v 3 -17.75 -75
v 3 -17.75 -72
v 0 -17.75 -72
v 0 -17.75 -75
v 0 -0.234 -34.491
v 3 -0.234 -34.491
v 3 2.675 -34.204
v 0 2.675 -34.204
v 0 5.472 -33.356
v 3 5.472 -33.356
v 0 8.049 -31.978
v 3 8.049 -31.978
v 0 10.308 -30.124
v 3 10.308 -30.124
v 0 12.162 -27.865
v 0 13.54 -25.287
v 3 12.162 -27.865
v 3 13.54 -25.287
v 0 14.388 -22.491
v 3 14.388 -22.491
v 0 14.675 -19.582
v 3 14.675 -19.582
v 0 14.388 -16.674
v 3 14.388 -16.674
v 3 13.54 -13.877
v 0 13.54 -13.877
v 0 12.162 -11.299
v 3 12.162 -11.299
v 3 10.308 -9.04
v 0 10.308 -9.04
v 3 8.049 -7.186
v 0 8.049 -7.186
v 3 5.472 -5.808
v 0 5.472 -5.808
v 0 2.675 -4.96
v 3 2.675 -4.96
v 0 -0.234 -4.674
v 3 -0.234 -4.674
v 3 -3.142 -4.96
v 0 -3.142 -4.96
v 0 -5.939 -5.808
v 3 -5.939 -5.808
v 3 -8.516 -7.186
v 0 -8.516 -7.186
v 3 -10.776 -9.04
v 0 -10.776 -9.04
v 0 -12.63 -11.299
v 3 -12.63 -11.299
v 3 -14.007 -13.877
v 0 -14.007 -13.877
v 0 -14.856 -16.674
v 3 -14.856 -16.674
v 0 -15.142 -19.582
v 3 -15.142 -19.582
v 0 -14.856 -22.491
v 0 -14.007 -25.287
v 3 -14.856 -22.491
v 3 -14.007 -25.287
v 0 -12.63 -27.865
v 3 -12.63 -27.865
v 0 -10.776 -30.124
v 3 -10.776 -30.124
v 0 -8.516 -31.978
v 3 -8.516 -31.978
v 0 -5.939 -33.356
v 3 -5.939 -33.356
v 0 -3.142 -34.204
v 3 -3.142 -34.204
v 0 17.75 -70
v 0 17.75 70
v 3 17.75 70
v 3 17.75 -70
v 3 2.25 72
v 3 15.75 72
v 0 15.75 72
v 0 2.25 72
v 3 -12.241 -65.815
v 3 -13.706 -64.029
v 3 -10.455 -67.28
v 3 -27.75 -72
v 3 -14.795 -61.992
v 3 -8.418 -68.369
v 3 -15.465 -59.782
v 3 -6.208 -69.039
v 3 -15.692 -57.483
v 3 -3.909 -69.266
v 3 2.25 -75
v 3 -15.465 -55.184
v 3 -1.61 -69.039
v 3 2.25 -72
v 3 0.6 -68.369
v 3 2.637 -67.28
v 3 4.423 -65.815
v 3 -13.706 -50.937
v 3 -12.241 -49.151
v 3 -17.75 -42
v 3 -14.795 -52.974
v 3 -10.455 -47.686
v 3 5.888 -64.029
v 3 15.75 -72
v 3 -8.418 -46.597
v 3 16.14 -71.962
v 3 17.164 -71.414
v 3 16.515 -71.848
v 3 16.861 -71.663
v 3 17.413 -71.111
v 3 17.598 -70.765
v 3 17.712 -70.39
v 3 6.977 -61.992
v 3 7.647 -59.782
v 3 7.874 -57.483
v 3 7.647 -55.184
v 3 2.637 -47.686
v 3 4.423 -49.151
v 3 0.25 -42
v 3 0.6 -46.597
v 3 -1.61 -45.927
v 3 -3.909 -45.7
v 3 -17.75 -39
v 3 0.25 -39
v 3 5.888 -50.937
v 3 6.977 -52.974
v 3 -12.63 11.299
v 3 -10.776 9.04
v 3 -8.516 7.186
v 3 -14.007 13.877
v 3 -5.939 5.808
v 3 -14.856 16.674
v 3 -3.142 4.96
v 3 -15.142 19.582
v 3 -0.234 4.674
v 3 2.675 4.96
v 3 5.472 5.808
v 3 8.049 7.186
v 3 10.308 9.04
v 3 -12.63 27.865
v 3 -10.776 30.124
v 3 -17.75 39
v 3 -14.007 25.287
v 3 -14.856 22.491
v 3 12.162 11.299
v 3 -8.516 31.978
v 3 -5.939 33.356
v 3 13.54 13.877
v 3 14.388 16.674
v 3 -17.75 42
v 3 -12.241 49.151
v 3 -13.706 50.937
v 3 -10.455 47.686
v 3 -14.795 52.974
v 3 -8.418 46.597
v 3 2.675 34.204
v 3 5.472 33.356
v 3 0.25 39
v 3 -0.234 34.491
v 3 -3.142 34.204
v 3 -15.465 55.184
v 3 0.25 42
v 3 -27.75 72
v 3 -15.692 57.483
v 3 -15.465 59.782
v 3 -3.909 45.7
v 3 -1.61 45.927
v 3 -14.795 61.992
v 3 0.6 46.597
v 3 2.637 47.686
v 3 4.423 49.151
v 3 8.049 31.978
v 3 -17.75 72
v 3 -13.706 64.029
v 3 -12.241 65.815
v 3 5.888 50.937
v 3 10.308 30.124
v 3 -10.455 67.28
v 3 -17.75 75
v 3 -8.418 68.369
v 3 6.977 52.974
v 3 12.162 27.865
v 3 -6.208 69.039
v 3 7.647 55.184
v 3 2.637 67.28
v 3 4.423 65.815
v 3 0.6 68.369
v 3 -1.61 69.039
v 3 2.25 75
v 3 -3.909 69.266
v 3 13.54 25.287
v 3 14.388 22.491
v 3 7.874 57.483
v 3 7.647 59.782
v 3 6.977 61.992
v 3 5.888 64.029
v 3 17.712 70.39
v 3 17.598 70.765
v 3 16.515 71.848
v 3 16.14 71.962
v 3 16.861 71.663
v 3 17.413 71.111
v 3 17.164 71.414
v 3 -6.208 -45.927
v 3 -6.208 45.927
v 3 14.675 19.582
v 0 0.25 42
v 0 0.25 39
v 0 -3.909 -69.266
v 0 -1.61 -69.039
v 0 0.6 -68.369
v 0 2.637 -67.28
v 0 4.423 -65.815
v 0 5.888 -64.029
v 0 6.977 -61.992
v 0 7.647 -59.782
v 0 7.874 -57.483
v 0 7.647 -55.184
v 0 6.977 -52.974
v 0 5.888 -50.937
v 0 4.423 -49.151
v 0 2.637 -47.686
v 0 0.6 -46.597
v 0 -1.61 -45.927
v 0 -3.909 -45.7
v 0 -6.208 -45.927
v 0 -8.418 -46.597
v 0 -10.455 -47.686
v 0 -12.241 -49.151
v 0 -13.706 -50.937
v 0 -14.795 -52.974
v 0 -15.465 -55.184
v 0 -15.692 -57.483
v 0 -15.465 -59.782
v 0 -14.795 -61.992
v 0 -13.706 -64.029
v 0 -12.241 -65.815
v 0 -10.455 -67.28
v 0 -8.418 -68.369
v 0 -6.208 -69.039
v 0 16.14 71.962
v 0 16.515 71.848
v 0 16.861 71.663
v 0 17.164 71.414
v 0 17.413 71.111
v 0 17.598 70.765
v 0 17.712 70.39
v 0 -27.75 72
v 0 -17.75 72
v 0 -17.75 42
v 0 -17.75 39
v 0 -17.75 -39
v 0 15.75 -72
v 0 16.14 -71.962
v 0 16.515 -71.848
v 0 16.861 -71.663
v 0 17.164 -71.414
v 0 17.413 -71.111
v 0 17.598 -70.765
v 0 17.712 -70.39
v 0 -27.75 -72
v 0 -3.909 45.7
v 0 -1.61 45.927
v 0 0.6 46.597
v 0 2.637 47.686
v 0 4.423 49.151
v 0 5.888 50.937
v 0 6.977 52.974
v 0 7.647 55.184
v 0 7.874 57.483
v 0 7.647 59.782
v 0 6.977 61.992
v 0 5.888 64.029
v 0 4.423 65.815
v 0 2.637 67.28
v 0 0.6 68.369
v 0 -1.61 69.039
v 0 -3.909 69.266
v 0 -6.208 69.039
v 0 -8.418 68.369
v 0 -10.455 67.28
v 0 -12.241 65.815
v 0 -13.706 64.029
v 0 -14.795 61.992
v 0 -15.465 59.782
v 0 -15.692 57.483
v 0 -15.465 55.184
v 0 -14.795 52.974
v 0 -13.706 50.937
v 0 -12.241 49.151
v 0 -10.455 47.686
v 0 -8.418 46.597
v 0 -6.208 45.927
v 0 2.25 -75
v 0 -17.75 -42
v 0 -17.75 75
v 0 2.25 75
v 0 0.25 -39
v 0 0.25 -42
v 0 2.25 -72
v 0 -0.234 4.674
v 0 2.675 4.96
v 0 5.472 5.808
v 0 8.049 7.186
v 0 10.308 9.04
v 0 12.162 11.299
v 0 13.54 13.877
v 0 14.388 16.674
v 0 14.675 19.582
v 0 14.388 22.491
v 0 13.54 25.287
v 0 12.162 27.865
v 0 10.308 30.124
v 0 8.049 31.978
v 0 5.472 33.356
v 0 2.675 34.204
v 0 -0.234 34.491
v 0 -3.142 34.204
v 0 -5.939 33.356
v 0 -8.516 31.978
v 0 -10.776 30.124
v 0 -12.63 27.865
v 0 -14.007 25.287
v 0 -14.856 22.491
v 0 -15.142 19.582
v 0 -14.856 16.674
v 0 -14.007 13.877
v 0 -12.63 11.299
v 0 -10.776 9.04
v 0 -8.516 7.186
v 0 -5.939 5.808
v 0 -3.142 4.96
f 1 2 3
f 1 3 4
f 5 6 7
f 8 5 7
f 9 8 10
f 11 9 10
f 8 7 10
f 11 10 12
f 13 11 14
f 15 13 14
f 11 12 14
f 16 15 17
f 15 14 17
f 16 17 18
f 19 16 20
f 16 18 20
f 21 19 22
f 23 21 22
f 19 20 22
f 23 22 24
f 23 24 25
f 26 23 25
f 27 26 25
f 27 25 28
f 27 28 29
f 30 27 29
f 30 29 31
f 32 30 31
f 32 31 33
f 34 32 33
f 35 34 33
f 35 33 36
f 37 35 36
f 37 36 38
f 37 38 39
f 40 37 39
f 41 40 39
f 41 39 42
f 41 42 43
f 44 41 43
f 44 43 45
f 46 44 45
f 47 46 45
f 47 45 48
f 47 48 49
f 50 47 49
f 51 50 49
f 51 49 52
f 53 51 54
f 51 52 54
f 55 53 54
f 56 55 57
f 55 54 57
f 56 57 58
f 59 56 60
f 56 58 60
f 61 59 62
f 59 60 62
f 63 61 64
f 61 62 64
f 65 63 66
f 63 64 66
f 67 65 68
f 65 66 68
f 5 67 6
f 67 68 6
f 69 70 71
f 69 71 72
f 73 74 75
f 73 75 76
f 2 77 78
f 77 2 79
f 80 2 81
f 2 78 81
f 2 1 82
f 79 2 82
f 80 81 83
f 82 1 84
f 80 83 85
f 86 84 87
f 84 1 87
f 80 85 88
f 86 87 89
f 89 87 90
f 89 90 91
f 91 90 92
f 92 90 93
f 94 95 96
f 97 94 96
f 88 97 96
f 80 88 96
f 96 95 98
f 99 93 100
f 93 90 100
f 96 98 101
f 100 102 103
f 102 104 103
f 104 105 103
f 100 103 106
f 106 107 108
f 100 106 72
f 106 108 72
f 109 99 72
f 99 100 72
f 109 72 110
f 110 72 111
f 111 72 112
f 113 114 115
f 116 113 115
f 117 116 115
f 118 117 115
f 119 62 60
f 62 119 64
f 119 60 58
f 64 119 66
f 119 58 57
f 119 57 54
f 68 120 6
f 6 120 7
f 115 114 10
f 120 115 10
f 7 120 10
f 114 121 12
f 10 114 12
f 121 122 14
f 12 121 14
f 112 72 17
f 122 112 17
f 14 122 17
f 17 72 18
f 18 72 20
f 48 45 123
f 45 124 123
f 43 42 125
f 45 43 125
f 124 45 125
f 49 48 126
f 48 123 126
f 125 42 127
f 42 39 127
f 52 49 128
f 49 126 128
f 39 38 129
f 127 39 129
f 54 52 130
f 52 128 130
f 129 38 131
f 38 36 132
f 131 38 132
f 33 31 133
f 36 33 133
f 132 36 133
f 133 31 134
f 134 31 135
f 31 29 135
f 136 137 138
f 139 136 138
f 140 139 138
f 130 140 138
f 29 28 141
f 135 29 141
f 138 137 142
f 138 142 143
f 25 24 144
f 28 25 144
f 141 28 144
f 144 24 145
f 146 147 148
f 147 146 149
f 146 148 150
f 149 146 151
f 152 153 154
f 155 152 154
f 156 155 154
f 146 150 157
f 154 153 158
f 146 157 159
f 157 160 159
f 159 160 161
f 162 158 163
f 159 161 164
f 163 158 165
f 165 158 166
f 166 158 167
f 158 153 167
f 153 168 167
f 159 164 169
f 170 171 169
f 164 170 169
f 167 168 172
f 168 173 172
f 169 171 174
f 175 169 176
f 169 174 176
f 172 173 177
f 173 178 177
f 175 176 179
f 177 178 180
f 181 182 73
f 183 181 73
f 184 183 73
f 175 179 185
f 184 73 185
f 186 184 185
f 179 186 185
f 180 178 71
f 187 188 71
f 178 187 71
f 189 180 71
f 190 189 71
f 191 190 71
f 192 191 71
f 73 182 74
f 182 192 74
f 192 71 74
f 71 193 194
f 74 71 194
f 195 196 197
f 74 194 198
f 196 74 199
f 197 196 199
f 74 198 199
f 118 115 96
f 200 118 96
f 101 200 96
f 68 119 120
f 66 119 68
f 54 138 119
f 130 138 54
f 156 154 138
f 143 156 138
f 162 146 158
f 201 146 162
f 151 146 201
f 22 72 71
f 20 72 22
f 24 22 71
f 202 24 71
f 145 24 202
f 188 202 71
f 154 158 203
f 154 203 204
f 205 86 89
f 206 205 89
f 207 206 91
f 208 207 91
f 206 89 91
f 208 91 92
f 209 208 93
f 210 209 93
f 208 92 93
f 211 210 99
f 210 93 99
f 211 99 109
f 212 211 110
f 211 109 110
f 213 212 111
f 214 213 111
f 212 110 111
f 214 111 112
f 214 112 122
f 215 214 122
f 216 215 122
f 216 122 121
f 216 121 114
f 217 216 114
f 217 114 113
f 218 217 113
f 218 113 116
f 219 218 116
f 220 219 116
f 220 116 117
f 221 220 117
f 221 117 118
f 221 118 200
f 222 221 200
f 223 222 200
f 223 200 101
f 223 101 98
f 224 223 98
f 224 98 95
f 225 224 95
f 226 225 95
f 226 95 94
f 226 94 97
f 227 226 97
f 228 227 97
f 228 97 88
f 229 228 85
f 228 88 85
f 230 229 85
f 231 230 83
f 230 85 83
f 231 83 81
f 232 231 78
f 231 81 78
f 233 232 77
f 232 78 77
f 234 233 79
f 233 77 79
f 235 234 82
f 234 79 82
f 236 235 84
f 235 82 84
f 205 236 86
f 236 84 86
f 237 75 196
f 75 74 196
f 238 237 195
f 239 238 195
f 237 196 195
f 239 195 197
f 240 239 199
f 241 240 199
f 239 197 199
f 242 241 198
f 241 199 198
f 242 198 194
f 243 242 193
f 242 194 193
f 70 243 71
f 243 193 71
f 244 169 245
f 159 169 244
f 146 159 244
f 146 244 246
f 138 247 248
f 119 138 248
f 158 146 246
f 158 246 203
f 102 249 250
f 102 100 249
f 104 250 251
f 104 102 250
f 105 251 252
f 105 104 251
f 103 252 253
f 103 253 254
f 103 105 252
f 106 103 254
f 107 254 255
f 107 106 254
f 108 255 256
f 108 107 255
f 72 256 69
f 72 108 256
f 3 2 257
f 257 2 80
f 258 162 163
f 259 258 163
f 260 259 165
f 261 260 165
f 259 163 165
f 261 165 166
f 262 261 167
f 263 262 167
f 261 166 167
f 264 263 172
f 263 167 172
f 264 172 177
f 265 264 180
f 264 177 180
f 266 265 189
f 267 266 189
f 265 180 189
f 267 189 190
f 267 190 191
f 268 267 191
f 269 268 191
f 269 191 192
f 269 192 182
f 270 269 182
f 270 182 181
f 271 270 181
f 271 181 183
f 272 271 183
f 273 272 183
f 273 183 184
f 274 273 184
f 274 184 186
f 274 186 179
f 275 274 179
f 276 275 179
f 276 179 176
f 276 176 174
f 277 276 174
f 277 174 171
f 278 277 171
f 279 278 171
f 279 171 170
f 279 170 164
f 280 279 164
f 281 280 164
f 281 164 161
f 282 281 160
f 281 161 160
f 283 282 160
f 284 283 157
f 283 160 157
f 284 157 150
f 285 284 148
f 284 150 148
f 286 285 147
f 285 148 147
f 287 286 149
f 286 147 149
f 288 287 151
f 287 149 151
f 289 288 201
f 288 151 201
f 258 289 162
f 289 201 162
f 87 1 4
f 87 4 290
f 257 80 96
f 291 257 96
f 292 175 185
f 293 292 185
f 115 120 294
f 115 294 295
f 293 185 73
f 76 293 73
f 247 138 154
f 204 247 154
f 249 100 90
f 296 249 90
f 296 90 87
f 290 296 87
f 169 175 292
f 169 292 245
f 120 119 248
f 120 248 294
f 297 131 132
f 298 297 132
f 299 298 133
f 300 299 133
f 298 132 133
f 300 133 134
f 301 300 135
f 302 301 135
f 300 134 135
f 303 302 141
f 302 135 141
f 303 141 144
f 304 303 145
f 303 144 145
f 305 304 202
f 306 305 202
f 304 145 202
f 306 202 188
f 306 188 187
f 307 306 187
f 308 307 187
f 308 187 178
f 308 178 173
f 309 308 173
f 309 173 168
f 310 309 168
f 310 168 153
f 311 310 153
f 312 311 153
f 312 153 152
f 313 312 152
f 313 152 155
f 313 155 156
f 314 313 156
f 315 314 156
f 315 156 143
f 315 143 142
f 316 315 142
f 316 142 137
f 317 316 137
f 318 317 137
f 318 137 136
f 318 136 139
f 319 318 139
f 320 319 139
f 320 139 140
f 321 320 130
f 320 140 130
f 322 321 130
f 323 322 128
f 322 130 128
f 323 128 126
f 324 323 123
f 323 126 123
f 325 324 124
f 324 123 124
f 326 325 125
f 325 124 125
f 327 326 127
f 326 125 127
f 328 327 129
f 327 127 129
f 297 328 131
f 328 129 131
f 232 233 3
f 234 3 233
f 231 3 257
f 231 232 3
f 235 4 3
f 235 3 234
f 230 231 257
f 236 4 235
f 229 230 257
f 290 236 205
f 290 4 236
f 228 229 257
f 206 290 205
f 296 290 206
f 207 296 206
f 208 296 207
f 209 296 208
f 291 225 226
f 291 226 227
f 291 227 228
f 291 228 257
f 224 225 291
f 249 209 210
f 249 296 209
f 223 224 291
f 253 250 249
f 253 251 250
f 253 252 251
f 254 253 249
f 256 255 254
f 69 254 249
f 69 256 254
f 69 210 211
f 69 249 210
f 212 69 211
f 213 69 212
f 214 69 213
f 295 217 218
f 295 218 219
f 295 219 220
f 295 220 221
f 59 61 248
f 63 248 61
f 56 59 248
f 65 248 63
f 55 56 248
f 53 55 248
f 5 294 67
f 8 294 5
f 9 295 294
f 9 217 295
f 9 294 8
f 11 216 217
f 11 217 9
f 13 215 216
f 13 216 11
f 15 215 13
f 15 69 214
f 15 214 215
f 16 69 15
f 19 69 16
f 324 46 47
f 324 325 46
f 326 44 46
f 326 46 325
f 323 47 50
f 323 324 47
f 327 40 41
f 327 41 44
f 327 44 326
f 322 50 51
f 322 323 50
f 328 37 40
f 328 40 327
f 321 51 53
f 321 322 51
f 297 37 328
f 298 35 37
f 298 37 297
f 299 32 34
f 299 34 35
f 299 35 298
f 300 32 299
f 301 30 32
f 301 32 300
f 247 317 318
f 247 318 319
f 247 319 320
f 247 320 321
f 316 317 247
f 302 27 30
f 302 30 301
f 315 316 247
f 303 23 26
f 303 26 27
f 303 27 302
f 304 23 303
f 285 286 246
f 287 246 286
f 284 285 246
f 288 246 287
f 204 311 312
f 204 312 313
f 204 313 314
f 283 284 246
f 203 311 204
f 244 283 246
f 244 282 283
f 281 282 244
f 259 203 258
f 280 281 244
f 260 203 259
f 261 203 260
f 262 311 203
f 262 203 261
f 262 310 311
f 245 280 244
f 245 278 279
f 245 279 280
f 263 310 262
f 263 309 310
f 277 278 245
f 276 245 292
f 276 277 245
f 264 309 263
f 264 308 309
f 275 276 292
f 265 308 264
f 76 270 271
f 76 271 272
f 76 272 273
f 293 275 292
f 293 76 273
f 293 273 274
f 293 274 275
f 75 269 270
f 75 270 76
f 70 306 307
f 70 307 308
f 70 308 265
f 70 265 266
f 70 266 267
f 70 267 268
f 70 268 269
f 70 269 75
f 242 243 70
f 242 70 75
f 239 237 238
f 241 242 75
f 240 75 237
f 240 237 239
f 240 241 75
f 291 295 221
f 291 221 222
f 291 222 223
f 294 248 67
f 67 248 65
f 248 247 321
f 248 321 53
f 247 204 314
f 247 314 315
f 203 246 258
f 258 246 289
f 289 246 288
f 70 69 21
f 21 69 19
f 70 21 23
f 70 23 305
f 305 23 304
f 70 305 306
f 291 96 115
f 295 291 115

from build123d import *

# Parameters (mm, degrees)
SKETCH1_W           = 144
SKETCH1_H           = 35.5
BOSS_EXTRUDE1_DEPTH = 3
FILLET1_R           = 2
SKETCH2_W           = 3
SKETCH2_H           = 18
CUT_EXTRUDE1_DEPTH  = 3
BOSS_EXTRUDE2_DEPTH = 3
SKETCH4_W           = 3
SKETCH4_H           = 20
BOSS_EXTRUDE3_DEPTH = 3
SKETCH6_R           = 11.782762771
SKETCH6_R_2         = 14.90857156
CUT_EXTRUDE2_DEPTH  = 10


with BuildPart() as part:
    # Sketch1 → Boss-Extrude1 (new body)
    with BuildSketch(Plane(origin=(0, 0, 0), x_dir=(0, 0, -1), z_dir=(1, 0, 0))):
        Rectangle(SKETCH1_W, SKETCH1_H)
    extrude(amount=BOSS_EXTRUDE1_DEPTH)

    # Fillet1
    fillet1_edges = [part.edges().sort_by_distance(p)[0] for p in [
        (1.5, 17.75, 72),
        (1.5, 17.75, -72),
    ]]
    fillet(fillet1_edges, radius=FILLET1_R)

    # Sketch2 → Cut-Extrude1 (cut)
    with BuildSketch(Plane(origin=(3, 0, 0), x_dir=(0, 0, -1), z_dir=(1, 0, 0))):
        with Locations((-40.5, -8.75)):
            Rectangle(SKETCH2_W, SKETCH2_H)
        with Locations((40.5, -8.75)):
            Rectangle(SKETCH2_W, SKETCH2_H)
    extrude(amount=-CUT_EXTRUDE1_DEPTH, mode=Mode.SUBTRACT)

    # Sketch3 → Boss-Extrude2 (add)
    with BuildSketch(Plane(origin=(3, 0, 0), x_dir=(0, 0, -1), z_dir=(1, 0, 0))):
        Polygon((-72, -17.75), (-72, -27.75), (-42, -17.75), align=None)
    boss_extrude2 = extrude(amount=-BOSS_EXTRUDE2_DEPTH)

    # Mirror1: Boss-Extrude2 across plane
    add(boss_extrude2.mirror(Plane.XY))

    # Sketch4 → Boss-Extrude3 (add)
    with BuildSketch(Plane(origin=(3, 0, 0), x_dir=(0, 0, -1), z_dir=(1, 0, 0))):
        with Locations((-73.5, -7.75)):
            Rectangle(SKETCH4_W, SKETCH4_H)
        with Locations((73.5, -7.75)):
            Rectangle(SKETCH4_W, SKETCH4_H)
    extrude(amount=-BOSS_EXTRUDE3_DEPTH)

    # Sketch6 → Cut-Extrude2 (cut)
    with BuildSketch(Plane(origin=(3, 0, 0), x_dir=(0, 0, -1), z_dir=(1, 0, 0))):
        with Locations((-57.483097662, -3.908912232)):
            Circle(SKETCH6_R)
        with Locations((-19.582154149, -0.233669225)):
            Circle(SKETCH6_R_2)
        with Locations((57.483097662, -3.908912232)):
            Circle(SKETCH6_R)
        with Locations((19.582154149, -0.233669225)):
            Circle(SKETCH6_R_2)
    extrude(amount=-CUT_EXTRUDE2_DEPTH, mode=Mode.SUBTRACT)


solid = part.part
